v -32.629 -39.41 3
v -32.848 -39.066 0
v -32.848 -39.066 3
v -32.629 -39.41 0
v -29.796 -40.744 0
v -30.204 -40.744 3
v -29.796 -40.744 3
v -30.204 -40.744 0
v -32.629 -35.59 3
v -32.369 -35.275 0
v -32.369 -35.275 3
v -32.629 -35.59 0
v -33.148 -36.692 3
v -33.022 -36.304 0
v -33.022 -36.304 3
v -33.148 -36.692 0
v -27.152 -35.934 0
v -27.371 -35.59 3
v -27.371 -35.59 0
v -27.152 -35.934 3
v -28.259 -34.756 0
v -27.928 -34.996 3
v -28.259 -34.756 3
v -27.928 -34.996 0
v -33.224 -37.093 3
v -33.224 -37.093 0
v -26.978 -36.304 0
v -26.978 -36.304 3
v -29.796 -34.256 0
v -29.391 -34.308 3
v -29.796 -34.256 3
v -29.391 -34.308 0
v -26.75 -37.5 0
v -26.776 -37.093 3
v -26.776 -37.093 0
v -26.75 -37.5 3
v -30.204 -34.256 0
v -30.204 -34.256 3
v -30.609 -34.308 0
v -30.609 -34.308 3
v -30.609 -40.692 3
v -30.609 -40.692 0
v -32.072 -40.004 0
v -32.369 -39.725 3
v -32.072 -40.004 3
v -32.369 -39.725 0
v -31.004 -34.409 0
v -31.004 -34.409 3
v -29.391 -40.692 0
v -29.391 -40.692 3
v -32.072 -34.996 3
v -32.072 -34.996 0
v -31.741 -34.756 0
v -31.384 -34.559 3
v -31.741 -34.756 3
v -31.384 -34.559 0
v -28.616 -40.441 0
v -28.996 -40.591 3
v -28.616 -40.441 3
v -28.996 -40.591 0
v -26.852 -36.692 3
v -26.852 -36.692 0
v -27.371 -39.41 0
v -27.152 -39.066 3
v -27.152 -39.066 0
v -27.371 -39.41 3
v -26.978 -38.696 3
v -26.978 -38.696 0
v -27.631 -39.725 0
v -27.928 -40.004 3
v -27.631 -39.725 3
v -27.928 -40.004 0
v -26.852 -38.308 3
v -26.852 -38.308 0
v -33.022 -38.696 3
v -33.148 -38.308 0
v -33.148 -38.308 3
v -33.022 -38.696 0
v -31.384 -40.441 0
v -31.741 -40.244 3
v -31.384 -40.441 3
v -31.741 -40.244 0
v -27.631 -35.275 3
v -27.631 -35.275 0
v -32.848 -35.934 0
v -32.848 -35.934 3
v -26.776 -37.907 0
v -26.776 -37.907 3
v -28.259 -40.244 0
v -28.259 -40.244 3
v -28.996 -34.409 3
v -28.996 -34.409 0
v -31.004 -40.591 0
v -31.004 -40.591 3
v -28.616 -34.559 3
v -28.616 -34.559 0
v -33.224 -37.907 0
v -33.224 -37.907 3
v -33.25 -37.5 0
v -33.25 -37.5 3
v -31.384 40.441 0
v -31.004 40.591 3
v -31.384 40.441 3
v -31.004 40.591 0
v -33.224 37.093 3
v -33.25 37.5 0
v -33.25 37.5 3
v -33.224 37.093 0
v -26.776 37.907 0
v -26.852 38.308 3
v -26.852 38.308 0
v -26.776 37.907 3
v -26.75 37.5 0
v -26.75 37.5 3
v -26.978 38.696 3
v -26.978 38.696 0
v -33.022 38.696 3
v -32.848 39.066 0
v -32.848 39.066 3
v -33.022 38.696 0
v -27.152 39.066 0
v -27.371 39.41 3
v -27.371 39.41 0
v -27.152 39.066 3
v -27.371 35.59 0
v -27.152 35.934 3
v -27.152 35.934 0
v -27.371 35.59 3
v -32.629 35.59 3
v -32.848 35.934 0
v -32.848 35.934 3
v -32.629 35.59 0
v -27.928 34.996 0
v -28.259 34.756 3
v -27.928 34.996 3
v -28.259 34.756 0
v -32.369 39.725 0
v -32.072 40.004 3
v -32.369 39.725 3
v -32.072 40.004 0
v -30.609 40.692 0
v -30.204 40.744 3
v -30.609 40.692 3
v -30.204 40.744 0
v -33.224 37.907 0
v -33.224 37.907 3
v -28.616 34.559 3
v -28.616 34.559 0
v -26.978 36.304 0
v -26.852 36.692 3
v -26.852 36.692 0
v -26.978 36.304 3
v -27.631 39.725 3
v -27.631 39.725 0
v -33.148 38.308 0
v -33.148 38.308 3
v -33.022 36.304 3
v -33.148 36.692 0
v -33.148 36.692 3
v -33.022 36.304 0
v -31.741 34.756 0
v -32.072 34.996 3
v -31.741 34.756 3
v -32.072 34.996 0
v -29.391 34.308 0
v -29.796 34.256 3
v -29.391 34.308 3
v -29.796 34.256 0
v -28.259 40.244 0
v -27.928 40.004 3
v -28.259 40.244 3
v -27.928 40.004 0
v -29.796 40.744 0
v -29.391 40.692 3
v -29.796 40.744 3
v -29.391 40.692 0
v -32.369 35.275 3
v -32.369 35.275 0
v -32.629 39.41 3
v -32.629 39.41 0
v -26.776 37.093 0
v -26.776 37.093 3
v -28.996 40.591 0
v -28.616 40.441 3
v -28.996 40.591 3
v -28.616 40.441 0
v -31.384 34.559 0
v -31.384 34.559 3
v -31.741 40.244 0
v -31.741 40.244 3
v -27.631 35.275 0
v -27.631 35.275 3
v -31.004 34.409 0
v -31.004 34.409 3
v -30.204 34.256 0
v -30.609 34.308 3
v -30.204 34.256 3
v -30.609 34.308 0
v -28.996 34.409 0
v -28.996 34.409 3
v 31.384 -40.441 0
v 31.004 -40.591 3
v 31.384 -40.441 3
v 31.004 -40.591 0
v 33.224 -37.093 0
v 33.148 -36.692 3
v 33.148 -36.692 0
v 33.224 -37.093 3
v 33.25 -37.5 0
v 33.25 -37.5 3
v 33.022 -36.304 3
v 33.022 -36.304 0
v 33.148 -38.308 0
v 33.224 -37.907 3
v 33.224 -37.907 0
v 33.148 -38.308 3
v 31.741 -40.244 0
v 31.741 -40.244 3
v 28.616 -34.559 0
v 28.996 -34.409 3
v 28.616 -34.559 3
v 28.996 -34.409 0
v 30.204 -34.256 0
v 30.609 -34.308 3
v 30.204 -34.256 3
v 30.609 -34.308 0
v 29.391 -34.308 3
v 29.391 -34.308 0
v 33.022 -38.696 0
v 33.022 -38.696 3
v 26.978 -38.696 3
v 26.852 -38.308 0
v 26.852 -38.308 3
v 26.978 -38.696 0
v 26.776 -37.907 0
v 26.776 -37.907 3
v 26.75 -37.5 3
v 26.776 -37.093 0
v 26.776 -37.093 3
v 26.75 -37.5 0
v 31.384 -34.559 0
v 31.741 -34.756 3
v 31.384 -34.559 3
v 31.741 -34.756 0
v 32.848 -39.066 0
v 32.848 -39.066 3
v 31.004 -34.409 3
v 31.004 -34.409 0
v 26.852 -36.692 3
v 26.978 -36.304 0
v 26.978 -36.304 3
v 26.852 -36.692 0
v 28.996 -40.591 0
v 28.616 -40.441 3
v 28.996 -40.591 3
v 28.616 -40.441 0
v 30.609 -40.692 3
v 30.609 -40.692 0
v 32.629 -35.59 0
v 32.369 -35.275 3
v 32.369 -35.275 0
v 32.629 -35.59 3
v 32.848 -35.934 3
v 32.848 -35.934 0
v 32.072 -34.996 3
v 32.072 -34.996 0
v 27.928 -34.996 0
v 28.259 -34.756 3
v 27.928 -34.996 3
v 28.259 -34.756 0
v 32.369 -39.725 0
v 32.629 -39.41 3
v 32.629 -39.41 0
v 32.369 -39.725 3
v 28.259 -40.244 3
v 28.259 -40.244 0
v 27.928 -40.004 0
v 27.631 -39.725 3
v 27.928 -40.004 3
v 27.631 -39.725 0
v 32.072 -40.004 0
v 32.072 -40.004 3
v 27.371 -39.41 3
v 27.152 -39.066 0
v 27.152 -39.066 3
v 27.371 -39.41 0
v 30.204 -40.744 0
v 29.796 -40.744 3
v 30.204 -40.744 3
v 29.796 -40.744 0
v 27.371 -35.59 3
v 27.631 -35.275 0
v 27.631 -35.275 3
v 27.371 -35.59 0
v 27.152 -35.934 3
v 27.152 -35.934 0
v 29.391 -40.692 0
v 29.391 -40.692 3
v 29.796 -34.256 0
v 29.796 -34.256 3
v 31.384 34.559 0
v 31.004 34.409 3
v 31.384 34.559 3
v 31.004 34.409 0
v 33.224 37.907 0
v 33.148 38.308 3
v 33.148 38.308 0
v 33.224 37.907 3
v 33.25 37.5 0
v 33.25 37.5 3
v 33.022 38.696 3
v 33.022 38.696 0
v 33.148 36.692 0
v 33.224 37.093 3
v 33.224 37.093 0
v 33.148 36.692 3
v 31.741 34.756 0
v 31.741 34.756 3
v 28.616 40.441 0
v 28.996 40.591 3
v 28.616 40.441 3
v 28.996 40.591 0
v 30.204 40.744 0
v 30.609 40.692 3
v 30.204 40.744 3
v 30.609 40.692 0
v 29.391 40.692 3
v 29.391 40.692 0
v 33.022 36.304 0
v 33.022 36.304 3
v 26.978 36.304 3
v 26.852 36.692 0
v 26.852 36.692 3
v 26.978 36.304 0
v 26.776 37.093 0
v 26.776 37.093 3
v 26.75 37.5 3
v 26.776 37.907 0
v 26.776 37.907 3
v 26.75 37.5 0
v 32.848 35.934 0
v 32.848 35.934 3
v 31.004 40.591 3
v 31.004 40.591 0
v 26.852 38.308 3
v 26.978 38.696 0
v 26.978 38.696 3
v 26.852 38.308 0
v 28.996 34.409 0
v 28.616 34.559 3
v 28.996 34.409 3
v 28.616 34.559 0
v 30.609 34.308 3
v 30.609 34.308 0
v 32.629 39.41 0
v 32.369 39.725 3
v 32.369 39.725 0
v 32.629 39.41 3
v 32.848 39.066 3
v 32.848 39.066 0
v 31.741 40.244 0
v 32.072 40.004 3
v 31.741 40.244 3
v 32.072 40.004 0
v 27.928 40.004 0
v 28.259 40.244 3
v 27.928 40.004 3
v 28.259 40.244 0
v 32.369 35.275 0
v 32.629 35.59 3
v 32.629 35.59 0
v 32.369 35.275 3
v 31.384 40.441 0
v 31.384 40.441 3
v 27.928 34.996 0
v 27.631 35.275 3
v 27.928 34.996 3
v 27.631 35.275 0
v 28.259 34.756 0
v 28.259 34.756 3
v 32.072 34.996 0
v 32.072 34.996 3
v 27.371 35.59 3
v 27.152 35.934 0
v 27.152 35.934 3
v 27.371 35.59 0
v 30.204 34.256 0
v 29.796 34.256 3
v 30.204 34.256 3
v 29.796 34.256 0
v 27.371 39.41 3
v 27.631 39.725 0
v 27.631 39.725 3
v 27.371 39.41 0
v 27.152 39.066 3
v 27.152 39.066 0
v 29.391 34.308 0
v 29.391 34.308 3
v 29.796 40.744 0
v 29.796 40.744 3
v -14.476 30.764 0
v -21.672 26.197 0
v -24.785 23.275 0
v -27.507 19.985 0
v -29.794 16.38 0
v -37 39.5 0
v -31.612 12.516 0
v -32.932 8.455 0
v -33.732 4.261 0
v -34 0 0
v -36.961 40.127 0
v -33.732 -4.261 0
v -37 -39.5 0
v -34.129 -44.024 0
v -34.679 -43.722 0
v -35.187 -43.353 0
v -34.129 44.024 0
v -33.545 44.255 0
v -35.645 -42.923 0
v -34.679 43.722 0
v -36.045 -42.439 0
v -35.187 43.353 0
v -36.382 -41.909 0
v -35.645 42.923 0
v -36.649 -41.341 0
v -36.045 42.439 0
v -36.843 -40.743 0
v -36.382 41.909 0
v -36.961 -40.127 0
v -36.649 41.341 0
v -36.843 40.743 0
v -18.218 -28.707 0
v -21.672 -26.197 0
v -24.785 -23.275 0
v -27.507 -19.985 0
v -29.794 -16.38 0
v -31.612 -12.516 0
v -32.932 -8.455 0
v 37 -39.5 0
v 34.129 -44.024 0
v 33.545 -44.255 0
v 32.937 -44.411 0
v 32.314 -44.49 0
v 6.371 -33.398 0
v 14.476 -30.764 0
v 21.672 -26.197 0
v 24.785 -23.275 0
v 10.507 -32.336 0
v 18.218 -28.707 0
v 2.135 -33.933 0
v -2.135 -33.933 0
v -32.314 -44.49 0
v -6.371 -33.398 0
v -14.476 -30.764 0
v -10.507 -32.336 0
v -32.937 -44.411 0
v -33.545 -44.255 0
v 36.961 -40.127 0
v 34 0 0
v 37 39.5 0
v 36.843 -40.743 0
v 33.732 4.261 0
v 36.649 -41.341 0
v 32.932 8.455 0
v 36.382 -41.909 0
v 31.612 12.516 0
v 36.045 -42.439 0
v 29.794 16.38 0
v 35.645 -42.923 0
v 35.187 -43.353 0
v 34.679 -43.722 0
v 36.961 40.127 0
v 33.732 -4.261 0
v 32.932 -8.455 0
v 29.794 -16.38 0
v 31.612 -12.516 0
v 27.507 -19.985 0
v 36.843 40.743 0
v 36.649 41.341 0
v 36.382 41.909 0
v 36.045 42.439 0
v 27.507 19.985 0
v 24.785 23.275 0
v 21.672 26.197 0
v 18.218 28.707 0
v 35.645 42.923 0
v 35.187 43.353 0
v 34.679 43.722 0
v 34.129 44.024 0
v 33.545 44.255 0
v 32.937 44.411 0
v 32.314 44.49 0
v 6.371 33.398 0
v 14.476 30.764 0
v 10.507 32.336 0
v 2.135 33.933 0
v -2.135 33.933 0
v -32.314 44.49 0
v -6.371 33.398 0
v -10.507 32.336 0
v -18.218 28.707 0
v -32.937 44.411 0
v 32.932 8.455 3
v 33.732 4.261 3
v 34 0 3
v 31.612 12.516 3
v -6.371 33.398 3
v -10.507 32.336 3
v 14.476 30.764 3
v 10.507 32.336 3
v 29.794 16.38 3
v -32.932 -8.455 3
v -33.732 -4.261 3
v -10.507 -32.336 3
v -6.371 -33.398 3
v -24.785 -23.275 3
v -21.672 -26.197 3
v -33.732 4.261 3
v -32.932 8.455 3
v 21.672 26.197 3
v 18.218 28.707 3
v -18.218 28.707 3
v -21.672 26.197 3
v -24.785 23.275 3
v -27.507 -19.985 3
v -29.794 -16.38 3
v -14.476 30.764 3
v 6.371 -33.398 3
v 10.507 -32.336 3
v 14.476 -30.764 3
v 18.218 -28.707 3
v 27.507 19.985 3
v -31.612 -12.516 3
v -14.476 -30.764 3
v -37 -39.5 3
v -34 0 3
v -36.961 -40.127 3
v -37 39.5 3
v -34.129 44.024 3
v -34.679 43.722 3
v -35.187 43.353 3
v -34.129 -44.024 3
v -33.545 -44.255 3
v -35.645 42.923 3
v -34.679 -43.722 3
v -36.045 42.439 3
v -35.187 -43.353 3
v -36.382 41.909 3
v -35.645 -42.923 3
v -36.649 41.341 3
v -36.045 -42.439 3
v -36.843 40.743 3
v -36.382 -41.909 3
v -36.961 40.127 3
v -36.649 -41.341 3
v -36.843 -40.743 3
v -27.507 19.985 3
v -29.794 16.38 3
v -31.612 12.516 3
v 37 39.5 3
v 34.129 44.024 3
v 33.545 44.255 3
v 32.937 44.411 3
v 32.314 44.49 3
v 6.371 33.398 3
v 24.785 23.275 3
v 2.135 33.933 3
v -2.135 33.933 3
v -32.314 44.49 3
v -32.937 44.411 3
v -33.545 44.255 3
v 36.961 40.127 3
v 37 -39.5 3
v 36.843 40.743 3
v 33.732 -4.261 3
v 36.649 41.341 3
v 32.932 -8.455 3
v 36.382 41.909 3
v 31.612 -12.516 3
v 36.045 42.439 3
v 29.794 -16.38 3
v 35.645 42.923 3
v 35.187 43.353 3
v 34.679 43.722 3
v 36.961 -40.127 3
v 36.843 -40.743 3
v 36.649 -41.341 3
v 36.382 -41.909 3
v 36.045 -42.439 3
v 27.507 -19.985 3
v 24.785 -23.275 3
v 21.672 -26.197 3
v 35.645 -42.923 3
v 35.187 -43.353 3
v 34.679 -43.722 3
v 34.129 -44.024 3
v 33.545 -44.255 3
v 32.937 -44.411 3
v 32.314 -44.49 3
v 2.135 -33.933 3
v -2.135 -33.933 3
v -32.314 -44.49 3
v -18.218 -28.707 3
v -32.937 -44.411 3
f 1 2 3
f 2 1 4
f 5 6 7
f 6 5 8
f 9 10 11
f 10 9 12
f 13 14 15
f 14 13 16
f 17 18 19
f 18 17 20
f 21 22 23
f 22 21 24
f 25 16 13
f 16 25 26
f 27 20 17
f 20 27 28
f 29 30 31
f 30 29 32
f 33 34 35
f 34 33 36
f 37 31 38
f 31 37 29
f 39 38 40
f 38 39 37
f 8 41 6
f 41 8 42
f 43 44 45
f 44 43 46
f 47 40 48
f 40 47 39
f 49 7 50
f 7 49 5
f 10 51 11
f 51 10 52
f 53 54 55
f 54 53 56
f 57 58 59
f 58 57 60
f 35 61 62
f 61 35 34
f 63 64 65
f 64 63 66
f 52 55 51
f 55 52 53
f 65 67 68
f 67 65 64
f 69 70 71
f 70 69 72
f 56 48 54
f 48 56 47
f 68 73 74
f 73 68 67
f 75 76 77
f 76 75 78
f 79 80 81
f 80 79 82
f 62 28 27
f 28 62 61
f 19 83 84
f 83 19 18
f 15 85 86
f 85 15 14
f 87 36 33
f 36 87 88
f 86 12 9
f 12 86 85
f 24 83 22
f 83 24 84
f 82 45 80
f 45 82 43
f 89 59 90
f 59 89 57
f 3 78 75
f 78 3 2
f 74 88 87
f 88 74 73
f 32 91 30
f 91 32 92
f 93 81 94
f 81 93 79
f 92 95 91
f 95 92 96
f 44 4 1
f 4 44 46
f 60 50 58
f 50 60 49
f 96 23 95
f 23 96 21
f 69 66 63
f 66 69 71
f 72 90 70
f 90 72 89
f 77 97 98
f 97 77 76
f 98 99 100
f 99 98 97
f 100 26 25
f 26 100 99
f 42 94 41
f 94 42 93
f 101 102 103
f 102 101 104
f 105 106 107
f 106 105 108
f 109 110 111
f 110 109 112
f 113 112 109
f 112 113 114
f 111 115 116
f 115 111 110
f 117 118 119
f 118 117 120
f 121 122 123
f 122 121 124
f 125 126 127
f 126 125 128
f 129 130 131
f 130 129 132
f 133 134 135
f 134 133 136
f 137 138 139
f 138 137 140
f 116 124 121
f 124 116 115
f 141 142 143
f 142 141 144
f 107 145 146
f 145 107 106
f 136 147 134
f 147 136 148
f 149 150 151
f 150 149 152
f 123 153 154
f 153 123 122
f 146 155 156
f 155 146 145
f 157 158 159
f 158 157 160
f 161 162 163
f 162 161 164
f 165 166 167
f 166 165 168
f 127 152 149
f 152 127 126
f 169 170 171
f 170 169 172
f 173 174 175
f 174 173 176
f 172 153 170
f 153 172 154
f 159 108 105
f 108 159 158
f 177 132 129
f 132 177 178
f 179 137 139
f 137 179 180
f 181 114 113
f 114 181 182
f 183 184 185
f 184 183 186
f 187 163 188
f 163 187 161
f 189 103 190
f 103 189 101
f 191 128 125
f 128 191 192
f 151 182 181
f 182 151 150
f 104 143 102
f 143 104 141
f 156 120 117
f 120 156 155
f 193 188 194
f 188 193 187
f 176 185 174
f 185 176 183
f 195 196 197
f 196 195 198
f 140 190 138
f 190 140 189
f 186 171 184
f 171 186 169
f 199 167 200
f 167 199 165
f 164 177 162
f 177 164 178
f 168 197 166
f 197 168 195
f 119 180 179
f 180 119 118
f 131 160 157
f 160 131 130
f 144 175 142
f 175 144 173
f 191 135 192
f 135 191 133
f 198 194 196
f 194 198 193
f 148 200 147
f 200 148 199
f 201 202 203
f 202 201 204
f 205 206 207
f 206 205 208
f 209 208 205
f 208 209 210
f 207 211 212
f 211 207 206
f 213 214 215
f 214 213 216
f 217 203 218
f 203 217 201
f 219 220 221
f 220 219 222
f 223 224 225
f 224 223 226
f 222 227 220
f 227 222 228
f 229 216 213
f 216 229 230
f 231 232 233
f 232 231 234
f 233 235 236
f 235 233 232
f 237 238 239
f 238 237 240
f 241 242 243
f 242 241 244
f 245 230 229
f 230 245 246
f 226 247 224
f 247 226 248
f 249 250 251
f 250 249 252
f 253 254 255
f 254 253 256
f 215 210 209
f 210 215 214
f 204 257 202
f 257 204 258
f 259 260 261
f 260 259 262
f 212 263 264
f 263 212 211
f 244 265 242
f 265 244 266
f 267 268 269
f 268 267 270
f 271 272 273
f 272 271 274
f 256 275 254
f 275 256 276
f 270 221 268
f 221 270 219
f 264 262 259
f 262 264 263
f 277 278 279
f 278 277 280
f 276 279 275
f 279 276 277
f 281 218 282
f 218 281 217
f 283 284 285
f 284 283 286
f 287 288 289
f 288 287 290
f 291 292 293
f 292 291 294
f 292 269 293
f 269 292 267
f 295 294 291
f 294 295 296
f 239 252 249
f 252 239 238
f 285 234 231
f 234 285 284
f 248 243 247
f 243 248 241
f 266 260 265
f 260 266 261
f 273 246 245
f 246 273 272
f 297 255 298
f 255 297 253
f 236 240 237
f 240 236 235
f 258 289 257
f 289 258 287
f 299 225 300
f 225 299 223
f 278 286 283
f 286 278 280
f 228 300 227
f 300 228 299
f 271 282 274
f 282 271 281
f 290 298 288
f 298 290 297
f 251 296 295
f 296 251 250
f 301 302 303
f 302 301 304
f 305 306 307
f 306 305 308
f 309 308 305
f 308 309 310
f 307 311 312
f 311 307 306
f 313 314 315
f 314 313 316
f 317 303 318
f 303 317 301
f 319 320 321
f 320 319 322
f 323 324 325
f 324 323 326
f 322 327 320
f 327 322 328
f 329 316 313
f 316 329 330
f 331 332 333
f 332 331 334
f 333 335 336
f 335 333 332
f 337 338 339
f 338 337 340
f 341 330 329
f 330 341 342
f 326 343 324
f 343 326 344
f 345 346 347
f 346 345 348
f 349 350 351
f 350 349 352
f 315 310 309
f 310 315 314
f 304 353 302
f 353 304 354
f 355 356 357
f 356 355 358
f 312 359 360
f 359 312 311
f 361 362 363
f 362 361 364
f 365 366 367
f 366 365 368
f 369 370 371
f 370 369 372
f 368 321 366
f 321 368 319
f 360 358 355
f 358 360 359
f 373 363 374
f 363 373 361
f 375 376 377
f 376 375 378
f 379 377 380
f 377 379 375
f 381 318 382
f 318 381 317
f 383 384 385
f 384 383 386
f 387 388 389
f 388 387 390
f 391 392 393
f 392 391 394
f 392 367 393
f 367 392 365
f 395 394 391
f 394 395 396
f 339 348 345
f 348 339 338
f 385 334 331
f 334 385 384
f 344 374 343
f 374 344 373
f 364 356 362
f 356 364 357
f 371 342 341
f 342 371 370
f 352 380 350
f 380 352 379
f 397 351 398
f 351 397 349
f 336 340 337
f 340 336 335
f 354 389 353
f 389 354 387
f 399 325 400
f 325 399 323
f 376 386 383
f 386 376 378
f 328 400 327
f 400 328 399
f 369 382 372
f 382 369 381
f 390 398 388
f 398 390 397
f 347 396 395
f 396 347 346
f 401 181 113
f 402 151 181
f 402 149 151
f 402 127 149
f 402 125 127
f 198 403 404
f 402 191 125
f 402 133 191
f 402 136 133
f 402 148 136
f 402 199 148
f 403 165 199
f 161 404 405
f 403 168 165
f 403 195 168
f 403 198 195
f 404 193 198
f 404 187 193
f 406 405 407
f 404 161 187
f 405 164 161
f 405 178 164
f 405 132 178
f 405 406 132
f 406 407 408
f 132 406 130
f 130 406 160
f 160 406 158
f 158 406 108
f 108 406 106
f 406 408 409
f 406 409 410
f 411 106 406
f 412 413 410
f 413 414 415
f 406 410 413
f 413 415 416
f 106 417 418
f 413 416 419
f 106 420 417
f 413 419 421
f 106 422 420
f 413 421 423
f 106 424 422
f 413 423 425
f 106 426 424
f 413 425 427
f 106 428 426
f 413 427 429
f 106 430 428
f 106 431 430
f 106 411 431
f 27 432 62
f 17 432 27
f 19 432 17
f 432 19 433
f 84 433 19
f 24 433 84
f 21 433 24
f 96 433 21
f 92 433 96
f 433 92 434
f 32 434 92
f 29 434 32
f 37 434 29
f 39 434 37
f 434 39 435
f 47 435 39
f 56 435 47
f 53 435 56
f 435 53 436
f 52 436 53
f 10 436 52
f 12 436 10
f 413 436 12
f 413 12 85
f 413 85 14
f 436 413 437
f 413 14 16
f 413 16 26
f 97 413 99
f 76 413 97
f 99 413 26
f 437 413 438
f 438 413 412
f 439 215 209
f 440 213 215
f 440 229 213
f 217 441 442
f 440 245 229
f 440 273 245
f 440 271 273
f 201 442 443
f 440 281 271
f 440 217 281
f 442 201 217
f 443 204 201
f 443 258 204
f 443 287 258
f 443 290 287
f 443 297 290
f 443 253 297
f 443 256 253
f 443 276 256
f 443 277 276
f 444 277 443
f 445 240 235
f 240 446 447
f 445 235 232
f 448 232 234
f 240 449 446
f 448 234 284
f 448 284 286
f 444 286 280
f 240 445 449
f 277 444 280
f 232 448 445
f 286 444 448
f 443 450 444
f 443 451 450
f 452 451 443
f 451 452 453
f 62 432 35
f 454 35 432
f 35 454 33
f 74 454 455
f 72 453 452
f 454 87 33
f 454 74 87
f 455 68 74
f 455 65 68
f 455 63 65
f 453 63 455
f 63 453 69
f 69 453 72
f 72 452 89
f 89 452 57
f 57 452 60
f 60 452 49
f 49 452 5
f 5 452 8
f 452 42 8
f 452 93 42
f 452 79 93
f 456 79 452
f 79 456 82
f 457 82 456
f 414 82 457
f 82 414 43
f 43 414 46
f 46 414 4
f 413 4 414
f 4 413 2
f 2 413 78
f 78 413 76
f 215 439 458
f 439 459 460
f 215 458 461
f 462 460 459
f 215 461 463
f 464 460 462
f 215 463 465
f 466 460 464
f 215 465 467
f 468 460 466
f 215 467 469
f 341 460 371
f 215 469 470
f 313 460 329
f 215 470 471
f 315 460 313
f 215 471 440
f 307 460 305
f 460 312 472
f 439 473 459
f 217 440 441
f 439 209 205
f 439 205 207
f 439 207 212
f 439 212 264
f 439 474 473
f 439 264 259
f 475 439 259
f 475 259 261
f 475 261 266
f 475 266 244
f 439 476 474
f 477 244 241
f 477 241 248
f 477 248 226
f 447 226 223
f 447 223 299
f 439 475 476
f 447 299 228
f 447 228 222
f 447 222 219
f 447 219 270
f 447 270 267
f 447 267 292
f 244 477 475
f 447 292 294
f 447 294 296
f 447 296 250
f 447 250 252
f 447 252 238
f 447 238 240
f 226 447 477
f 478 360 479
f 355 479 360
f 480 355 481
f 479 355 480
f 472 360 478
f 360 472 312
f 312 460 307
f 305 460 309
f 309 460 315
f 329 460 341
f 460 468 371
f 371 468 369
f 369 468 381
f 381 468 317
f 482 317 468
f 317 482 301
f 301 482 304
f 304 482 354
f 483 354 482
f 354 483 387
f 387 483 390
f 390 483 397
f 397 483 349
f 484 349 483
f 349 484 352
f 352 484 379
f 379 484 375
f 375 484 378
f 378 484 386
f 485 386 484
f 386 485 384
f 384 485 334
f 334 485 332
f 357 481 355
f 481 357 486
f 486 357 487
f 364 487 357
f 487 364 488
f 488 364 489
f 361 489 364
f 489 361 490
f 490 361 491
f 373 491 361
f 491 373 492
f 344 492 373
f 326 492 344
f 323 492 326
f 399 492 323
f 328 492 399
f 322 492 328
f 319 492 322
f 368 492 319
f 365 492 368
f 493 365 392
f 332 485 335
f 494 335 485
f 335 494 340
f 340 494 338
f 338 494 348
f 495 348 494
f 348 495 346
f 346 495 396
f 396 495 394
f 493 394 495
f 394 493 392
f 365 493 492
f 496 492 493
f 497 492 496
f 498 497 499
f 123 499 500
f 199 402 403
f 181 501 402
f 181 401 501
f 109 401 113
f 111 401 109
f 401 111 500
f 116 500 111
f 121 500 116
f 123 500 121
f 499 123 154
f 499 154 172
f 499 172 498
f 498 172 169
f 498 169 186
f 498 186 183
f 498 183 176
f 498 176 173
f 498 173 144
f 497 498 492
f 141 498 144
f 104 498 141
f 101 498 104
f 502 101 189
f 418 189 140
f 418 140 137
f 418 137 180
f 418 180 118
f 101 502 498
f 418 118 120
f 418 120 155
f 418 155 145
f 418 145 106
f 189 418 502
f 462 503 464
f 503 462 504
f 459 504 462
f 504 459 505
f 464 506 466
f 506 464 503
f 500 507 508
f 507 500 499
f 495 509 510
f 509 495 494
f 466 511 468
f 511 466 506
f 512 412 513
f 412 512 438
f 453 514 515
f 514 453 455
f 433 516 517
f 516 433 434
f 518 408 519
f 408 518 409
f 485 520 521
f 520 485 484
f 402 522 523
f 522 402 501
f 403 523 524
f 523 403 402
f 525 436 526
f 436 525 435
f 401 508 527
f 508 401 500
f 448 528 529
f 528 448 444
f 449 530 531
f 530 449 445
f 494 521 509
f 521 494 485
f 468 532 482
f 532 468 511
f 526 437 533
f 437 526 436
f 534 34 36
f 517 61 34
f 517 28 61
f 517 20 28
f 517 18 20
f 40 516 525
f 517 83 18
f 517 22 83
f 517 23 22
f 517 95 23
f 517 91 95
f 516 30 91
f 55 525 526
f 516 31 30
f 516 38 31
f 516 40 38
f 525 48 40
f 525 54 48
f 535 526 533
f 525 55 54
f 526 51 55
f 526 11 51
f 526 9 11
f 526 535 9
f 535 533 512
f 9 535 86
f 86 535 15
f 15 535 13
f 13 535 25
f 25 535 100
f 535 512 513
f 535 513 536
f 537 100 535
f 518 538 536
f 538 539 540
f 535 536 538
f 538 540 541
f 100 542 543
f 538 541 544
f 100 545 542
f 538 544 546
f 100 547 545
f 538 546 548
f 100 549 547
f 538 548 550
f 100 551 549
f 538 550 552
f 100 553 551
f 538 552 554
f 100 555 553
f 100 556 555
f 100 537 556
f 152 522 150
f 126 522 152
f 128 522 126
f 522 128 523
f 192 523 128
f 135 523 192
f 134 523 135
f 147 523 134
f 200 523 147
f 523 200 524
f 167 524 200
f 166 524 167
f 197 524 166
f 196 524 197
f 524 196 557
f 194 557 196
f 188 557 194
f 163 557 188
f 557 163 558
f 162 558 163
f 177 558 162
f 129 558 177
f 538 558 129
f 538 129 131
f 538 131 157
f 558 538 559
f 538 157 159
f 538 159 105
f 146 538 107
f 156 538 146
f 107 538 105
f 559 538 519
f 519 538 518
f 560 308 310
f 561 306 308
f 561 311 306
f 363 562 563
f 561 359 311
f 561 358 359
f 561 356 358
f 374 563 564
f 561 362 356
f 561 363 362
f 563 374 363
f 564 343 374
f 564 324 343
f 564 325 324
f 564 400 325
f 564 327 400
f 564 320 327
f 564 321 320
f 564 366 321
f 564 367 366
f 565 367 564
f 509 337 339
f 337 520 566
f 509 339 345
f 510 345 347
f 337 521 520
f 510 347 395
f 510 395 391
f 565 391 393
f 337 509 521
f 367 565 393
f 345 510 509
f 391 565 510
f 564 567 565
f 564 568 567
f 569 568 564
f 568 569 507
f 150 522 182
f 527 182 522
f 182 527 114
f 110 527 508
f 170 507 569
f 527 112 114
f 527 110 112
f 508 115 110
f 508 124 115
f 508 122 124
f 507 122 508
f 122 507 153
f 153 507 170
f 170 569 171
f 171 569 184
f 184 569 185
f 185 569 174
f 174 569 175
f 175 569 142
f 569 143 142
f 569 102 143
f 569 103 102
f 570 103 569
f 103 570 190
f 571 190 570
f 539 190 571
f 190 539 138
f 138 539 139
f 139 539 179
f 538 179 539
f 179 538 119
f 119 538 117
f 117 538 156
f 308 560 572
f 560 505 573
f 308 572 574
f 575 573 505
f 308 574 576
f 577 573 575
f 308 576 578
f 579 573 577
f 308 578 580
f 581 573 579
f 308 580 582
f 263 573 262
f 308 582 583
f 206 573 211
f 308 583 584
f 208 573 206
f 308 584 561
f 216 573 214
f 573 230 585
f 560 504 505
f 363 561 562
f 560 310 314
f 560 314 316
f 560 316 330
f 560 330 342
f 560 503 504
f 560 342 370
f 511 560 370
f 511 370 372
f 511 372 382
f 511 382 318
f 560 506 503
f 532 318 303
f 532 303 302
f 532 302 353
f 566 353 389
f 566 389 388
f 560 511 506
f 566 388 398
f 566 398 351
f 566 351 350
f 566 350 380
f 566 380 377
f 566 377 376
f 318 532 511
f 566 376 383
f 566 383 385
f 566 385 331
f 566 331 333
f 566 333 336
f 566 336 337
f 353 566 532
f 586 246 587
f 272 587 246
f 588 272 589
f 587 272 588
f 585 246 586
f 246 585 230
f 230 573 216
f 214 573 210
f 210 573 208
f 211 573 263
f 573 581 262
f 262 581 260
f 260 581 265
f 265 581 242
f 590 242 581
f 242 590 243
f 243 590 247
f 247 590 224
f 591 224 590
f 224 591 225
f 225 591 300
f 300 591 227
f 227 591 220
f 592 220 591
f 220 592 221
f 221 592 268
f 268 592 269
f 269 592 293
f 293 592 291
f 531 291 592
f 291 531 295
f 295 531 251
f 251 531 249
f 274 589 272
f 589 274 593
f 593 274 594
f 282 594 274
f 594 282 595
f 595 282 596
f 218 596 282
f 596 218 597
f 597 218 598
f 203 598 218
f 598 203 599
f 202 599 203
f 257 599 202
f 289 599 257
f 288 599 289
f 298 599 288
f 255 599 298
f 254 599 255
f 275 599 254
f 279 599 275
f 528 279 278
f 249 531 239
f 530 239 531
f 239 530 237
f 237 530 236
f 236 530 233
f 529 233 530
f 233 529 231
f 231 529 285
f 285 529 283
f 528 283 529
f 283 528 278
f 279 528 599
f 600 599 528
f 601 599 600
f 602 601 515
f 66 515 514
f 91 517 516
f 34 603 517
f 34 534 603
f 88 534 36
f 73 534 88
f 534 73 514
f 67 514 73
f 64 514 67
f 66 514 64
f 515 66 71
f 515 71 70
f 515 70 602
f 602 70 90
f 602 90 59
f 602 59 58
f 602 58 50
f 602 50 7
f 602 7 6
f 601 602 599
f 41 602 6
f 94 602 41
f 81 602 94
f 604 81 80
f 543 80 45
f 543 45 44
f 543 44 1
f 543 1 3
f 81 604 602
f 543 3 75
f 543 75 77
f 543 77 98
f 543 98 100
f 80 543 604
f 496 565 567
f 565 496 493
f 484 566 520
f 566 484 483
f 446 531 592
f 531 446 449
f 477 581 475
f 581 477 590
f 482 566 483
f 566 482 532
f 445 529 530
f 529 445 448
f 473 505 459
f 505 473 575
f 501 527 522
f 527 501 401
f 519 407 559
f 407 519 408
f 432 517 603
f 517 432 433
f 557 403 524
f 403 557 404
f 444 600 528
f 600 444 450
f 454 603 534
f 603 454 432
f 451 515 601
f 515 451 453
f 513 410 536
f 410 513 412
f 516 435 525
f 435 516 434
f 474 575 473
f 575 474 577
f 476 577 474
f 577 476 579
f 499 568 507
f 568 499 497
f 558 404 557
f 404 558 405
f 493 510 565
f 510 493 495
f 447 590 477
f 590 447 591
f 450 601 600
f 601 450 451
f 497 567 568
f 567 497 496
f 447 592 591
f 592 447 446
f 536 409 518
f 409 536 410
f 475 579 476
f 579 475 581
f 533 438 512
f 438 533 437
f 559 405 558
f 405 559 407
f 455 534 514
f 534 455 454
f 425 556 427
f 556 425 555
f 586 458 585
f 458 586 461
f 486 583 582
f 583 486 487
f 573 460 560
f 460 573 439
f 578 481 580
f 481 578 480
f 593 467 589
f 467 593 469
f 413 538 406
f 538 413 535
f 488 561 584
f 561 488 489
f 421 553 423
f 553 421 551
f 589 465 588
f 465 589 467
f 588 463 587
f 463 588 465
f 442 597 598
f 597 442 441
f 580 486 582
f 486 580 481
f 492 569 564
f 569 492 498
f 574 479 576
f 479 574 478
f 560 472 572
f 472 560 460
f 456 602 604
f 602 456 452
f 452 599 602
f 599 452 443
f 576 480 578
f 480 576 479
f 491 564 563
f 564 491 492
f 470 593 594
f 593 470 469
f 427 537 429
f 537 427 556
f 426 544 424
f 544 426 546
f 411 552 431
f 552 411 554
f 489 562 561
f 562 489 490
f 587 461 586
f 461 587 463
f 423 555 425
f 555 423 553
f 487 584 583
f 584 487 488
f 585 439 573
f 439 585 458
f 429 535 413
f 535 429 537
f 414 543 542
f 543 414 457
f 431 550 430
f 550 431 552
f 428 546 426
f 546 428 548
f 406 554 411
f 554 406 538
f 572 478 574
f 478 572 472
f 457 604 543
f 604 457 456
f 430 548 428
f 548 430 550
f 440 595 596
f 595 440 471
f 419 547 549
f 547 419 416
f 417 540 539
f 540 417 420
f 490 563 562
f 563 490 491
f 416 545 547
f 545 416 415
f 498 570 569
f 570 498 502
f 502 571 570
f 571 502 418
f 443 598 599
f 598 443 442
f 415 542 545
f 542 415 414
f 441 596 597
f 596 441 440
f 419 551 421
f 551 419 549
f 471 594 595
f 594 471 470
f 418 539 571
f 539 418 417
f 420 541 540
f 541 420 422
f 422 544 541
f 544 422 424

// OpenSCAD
$fn = 50;


difference() {
	union() {
		hull() {
			translate(v = [-32.0000000000, 39.5000000000, 0]) {
				cylinder(h = 3, r = 5);
			}
			translate(v = [32.0000000000, 39.5000000000, 0]) {
				cylinder(h = 3, r = 5);
			}
			translate(v = [-32.0000000000, -39.5000000000, 0]) {
				cylinder(h = 3, r = 5);
			}
			translate(v = [32.0000000000, -39.5000000000, 0]) {
				cylinder(h = 3, r = 5);
			}
		}
	}
	union() {
		#translate(v = [-30.0000000000, -37.5000000000, -100.0000000000]) {
			cylinder(h = 200, r = 3.2500000000);
		}
		#translate(v = [-30.0000000000, 37.5000000000, -100.0000000000]) {
			cylinder(h = 200, r = 3.2500000000);
		}
		#translate(v = [30.0000000000, -37.5000000000, -100.0000000000]) {
			cylinder(h = 200, r = 3.2500000000);
		}
		#translate(v = [30.0000000000, 37.5000000000, -100.0000000000]) {
			cylinder(h = 200, r = 3.2500000000);
		}
		#cylinder(h = 3, r = 34.0000000000);
	}
}
